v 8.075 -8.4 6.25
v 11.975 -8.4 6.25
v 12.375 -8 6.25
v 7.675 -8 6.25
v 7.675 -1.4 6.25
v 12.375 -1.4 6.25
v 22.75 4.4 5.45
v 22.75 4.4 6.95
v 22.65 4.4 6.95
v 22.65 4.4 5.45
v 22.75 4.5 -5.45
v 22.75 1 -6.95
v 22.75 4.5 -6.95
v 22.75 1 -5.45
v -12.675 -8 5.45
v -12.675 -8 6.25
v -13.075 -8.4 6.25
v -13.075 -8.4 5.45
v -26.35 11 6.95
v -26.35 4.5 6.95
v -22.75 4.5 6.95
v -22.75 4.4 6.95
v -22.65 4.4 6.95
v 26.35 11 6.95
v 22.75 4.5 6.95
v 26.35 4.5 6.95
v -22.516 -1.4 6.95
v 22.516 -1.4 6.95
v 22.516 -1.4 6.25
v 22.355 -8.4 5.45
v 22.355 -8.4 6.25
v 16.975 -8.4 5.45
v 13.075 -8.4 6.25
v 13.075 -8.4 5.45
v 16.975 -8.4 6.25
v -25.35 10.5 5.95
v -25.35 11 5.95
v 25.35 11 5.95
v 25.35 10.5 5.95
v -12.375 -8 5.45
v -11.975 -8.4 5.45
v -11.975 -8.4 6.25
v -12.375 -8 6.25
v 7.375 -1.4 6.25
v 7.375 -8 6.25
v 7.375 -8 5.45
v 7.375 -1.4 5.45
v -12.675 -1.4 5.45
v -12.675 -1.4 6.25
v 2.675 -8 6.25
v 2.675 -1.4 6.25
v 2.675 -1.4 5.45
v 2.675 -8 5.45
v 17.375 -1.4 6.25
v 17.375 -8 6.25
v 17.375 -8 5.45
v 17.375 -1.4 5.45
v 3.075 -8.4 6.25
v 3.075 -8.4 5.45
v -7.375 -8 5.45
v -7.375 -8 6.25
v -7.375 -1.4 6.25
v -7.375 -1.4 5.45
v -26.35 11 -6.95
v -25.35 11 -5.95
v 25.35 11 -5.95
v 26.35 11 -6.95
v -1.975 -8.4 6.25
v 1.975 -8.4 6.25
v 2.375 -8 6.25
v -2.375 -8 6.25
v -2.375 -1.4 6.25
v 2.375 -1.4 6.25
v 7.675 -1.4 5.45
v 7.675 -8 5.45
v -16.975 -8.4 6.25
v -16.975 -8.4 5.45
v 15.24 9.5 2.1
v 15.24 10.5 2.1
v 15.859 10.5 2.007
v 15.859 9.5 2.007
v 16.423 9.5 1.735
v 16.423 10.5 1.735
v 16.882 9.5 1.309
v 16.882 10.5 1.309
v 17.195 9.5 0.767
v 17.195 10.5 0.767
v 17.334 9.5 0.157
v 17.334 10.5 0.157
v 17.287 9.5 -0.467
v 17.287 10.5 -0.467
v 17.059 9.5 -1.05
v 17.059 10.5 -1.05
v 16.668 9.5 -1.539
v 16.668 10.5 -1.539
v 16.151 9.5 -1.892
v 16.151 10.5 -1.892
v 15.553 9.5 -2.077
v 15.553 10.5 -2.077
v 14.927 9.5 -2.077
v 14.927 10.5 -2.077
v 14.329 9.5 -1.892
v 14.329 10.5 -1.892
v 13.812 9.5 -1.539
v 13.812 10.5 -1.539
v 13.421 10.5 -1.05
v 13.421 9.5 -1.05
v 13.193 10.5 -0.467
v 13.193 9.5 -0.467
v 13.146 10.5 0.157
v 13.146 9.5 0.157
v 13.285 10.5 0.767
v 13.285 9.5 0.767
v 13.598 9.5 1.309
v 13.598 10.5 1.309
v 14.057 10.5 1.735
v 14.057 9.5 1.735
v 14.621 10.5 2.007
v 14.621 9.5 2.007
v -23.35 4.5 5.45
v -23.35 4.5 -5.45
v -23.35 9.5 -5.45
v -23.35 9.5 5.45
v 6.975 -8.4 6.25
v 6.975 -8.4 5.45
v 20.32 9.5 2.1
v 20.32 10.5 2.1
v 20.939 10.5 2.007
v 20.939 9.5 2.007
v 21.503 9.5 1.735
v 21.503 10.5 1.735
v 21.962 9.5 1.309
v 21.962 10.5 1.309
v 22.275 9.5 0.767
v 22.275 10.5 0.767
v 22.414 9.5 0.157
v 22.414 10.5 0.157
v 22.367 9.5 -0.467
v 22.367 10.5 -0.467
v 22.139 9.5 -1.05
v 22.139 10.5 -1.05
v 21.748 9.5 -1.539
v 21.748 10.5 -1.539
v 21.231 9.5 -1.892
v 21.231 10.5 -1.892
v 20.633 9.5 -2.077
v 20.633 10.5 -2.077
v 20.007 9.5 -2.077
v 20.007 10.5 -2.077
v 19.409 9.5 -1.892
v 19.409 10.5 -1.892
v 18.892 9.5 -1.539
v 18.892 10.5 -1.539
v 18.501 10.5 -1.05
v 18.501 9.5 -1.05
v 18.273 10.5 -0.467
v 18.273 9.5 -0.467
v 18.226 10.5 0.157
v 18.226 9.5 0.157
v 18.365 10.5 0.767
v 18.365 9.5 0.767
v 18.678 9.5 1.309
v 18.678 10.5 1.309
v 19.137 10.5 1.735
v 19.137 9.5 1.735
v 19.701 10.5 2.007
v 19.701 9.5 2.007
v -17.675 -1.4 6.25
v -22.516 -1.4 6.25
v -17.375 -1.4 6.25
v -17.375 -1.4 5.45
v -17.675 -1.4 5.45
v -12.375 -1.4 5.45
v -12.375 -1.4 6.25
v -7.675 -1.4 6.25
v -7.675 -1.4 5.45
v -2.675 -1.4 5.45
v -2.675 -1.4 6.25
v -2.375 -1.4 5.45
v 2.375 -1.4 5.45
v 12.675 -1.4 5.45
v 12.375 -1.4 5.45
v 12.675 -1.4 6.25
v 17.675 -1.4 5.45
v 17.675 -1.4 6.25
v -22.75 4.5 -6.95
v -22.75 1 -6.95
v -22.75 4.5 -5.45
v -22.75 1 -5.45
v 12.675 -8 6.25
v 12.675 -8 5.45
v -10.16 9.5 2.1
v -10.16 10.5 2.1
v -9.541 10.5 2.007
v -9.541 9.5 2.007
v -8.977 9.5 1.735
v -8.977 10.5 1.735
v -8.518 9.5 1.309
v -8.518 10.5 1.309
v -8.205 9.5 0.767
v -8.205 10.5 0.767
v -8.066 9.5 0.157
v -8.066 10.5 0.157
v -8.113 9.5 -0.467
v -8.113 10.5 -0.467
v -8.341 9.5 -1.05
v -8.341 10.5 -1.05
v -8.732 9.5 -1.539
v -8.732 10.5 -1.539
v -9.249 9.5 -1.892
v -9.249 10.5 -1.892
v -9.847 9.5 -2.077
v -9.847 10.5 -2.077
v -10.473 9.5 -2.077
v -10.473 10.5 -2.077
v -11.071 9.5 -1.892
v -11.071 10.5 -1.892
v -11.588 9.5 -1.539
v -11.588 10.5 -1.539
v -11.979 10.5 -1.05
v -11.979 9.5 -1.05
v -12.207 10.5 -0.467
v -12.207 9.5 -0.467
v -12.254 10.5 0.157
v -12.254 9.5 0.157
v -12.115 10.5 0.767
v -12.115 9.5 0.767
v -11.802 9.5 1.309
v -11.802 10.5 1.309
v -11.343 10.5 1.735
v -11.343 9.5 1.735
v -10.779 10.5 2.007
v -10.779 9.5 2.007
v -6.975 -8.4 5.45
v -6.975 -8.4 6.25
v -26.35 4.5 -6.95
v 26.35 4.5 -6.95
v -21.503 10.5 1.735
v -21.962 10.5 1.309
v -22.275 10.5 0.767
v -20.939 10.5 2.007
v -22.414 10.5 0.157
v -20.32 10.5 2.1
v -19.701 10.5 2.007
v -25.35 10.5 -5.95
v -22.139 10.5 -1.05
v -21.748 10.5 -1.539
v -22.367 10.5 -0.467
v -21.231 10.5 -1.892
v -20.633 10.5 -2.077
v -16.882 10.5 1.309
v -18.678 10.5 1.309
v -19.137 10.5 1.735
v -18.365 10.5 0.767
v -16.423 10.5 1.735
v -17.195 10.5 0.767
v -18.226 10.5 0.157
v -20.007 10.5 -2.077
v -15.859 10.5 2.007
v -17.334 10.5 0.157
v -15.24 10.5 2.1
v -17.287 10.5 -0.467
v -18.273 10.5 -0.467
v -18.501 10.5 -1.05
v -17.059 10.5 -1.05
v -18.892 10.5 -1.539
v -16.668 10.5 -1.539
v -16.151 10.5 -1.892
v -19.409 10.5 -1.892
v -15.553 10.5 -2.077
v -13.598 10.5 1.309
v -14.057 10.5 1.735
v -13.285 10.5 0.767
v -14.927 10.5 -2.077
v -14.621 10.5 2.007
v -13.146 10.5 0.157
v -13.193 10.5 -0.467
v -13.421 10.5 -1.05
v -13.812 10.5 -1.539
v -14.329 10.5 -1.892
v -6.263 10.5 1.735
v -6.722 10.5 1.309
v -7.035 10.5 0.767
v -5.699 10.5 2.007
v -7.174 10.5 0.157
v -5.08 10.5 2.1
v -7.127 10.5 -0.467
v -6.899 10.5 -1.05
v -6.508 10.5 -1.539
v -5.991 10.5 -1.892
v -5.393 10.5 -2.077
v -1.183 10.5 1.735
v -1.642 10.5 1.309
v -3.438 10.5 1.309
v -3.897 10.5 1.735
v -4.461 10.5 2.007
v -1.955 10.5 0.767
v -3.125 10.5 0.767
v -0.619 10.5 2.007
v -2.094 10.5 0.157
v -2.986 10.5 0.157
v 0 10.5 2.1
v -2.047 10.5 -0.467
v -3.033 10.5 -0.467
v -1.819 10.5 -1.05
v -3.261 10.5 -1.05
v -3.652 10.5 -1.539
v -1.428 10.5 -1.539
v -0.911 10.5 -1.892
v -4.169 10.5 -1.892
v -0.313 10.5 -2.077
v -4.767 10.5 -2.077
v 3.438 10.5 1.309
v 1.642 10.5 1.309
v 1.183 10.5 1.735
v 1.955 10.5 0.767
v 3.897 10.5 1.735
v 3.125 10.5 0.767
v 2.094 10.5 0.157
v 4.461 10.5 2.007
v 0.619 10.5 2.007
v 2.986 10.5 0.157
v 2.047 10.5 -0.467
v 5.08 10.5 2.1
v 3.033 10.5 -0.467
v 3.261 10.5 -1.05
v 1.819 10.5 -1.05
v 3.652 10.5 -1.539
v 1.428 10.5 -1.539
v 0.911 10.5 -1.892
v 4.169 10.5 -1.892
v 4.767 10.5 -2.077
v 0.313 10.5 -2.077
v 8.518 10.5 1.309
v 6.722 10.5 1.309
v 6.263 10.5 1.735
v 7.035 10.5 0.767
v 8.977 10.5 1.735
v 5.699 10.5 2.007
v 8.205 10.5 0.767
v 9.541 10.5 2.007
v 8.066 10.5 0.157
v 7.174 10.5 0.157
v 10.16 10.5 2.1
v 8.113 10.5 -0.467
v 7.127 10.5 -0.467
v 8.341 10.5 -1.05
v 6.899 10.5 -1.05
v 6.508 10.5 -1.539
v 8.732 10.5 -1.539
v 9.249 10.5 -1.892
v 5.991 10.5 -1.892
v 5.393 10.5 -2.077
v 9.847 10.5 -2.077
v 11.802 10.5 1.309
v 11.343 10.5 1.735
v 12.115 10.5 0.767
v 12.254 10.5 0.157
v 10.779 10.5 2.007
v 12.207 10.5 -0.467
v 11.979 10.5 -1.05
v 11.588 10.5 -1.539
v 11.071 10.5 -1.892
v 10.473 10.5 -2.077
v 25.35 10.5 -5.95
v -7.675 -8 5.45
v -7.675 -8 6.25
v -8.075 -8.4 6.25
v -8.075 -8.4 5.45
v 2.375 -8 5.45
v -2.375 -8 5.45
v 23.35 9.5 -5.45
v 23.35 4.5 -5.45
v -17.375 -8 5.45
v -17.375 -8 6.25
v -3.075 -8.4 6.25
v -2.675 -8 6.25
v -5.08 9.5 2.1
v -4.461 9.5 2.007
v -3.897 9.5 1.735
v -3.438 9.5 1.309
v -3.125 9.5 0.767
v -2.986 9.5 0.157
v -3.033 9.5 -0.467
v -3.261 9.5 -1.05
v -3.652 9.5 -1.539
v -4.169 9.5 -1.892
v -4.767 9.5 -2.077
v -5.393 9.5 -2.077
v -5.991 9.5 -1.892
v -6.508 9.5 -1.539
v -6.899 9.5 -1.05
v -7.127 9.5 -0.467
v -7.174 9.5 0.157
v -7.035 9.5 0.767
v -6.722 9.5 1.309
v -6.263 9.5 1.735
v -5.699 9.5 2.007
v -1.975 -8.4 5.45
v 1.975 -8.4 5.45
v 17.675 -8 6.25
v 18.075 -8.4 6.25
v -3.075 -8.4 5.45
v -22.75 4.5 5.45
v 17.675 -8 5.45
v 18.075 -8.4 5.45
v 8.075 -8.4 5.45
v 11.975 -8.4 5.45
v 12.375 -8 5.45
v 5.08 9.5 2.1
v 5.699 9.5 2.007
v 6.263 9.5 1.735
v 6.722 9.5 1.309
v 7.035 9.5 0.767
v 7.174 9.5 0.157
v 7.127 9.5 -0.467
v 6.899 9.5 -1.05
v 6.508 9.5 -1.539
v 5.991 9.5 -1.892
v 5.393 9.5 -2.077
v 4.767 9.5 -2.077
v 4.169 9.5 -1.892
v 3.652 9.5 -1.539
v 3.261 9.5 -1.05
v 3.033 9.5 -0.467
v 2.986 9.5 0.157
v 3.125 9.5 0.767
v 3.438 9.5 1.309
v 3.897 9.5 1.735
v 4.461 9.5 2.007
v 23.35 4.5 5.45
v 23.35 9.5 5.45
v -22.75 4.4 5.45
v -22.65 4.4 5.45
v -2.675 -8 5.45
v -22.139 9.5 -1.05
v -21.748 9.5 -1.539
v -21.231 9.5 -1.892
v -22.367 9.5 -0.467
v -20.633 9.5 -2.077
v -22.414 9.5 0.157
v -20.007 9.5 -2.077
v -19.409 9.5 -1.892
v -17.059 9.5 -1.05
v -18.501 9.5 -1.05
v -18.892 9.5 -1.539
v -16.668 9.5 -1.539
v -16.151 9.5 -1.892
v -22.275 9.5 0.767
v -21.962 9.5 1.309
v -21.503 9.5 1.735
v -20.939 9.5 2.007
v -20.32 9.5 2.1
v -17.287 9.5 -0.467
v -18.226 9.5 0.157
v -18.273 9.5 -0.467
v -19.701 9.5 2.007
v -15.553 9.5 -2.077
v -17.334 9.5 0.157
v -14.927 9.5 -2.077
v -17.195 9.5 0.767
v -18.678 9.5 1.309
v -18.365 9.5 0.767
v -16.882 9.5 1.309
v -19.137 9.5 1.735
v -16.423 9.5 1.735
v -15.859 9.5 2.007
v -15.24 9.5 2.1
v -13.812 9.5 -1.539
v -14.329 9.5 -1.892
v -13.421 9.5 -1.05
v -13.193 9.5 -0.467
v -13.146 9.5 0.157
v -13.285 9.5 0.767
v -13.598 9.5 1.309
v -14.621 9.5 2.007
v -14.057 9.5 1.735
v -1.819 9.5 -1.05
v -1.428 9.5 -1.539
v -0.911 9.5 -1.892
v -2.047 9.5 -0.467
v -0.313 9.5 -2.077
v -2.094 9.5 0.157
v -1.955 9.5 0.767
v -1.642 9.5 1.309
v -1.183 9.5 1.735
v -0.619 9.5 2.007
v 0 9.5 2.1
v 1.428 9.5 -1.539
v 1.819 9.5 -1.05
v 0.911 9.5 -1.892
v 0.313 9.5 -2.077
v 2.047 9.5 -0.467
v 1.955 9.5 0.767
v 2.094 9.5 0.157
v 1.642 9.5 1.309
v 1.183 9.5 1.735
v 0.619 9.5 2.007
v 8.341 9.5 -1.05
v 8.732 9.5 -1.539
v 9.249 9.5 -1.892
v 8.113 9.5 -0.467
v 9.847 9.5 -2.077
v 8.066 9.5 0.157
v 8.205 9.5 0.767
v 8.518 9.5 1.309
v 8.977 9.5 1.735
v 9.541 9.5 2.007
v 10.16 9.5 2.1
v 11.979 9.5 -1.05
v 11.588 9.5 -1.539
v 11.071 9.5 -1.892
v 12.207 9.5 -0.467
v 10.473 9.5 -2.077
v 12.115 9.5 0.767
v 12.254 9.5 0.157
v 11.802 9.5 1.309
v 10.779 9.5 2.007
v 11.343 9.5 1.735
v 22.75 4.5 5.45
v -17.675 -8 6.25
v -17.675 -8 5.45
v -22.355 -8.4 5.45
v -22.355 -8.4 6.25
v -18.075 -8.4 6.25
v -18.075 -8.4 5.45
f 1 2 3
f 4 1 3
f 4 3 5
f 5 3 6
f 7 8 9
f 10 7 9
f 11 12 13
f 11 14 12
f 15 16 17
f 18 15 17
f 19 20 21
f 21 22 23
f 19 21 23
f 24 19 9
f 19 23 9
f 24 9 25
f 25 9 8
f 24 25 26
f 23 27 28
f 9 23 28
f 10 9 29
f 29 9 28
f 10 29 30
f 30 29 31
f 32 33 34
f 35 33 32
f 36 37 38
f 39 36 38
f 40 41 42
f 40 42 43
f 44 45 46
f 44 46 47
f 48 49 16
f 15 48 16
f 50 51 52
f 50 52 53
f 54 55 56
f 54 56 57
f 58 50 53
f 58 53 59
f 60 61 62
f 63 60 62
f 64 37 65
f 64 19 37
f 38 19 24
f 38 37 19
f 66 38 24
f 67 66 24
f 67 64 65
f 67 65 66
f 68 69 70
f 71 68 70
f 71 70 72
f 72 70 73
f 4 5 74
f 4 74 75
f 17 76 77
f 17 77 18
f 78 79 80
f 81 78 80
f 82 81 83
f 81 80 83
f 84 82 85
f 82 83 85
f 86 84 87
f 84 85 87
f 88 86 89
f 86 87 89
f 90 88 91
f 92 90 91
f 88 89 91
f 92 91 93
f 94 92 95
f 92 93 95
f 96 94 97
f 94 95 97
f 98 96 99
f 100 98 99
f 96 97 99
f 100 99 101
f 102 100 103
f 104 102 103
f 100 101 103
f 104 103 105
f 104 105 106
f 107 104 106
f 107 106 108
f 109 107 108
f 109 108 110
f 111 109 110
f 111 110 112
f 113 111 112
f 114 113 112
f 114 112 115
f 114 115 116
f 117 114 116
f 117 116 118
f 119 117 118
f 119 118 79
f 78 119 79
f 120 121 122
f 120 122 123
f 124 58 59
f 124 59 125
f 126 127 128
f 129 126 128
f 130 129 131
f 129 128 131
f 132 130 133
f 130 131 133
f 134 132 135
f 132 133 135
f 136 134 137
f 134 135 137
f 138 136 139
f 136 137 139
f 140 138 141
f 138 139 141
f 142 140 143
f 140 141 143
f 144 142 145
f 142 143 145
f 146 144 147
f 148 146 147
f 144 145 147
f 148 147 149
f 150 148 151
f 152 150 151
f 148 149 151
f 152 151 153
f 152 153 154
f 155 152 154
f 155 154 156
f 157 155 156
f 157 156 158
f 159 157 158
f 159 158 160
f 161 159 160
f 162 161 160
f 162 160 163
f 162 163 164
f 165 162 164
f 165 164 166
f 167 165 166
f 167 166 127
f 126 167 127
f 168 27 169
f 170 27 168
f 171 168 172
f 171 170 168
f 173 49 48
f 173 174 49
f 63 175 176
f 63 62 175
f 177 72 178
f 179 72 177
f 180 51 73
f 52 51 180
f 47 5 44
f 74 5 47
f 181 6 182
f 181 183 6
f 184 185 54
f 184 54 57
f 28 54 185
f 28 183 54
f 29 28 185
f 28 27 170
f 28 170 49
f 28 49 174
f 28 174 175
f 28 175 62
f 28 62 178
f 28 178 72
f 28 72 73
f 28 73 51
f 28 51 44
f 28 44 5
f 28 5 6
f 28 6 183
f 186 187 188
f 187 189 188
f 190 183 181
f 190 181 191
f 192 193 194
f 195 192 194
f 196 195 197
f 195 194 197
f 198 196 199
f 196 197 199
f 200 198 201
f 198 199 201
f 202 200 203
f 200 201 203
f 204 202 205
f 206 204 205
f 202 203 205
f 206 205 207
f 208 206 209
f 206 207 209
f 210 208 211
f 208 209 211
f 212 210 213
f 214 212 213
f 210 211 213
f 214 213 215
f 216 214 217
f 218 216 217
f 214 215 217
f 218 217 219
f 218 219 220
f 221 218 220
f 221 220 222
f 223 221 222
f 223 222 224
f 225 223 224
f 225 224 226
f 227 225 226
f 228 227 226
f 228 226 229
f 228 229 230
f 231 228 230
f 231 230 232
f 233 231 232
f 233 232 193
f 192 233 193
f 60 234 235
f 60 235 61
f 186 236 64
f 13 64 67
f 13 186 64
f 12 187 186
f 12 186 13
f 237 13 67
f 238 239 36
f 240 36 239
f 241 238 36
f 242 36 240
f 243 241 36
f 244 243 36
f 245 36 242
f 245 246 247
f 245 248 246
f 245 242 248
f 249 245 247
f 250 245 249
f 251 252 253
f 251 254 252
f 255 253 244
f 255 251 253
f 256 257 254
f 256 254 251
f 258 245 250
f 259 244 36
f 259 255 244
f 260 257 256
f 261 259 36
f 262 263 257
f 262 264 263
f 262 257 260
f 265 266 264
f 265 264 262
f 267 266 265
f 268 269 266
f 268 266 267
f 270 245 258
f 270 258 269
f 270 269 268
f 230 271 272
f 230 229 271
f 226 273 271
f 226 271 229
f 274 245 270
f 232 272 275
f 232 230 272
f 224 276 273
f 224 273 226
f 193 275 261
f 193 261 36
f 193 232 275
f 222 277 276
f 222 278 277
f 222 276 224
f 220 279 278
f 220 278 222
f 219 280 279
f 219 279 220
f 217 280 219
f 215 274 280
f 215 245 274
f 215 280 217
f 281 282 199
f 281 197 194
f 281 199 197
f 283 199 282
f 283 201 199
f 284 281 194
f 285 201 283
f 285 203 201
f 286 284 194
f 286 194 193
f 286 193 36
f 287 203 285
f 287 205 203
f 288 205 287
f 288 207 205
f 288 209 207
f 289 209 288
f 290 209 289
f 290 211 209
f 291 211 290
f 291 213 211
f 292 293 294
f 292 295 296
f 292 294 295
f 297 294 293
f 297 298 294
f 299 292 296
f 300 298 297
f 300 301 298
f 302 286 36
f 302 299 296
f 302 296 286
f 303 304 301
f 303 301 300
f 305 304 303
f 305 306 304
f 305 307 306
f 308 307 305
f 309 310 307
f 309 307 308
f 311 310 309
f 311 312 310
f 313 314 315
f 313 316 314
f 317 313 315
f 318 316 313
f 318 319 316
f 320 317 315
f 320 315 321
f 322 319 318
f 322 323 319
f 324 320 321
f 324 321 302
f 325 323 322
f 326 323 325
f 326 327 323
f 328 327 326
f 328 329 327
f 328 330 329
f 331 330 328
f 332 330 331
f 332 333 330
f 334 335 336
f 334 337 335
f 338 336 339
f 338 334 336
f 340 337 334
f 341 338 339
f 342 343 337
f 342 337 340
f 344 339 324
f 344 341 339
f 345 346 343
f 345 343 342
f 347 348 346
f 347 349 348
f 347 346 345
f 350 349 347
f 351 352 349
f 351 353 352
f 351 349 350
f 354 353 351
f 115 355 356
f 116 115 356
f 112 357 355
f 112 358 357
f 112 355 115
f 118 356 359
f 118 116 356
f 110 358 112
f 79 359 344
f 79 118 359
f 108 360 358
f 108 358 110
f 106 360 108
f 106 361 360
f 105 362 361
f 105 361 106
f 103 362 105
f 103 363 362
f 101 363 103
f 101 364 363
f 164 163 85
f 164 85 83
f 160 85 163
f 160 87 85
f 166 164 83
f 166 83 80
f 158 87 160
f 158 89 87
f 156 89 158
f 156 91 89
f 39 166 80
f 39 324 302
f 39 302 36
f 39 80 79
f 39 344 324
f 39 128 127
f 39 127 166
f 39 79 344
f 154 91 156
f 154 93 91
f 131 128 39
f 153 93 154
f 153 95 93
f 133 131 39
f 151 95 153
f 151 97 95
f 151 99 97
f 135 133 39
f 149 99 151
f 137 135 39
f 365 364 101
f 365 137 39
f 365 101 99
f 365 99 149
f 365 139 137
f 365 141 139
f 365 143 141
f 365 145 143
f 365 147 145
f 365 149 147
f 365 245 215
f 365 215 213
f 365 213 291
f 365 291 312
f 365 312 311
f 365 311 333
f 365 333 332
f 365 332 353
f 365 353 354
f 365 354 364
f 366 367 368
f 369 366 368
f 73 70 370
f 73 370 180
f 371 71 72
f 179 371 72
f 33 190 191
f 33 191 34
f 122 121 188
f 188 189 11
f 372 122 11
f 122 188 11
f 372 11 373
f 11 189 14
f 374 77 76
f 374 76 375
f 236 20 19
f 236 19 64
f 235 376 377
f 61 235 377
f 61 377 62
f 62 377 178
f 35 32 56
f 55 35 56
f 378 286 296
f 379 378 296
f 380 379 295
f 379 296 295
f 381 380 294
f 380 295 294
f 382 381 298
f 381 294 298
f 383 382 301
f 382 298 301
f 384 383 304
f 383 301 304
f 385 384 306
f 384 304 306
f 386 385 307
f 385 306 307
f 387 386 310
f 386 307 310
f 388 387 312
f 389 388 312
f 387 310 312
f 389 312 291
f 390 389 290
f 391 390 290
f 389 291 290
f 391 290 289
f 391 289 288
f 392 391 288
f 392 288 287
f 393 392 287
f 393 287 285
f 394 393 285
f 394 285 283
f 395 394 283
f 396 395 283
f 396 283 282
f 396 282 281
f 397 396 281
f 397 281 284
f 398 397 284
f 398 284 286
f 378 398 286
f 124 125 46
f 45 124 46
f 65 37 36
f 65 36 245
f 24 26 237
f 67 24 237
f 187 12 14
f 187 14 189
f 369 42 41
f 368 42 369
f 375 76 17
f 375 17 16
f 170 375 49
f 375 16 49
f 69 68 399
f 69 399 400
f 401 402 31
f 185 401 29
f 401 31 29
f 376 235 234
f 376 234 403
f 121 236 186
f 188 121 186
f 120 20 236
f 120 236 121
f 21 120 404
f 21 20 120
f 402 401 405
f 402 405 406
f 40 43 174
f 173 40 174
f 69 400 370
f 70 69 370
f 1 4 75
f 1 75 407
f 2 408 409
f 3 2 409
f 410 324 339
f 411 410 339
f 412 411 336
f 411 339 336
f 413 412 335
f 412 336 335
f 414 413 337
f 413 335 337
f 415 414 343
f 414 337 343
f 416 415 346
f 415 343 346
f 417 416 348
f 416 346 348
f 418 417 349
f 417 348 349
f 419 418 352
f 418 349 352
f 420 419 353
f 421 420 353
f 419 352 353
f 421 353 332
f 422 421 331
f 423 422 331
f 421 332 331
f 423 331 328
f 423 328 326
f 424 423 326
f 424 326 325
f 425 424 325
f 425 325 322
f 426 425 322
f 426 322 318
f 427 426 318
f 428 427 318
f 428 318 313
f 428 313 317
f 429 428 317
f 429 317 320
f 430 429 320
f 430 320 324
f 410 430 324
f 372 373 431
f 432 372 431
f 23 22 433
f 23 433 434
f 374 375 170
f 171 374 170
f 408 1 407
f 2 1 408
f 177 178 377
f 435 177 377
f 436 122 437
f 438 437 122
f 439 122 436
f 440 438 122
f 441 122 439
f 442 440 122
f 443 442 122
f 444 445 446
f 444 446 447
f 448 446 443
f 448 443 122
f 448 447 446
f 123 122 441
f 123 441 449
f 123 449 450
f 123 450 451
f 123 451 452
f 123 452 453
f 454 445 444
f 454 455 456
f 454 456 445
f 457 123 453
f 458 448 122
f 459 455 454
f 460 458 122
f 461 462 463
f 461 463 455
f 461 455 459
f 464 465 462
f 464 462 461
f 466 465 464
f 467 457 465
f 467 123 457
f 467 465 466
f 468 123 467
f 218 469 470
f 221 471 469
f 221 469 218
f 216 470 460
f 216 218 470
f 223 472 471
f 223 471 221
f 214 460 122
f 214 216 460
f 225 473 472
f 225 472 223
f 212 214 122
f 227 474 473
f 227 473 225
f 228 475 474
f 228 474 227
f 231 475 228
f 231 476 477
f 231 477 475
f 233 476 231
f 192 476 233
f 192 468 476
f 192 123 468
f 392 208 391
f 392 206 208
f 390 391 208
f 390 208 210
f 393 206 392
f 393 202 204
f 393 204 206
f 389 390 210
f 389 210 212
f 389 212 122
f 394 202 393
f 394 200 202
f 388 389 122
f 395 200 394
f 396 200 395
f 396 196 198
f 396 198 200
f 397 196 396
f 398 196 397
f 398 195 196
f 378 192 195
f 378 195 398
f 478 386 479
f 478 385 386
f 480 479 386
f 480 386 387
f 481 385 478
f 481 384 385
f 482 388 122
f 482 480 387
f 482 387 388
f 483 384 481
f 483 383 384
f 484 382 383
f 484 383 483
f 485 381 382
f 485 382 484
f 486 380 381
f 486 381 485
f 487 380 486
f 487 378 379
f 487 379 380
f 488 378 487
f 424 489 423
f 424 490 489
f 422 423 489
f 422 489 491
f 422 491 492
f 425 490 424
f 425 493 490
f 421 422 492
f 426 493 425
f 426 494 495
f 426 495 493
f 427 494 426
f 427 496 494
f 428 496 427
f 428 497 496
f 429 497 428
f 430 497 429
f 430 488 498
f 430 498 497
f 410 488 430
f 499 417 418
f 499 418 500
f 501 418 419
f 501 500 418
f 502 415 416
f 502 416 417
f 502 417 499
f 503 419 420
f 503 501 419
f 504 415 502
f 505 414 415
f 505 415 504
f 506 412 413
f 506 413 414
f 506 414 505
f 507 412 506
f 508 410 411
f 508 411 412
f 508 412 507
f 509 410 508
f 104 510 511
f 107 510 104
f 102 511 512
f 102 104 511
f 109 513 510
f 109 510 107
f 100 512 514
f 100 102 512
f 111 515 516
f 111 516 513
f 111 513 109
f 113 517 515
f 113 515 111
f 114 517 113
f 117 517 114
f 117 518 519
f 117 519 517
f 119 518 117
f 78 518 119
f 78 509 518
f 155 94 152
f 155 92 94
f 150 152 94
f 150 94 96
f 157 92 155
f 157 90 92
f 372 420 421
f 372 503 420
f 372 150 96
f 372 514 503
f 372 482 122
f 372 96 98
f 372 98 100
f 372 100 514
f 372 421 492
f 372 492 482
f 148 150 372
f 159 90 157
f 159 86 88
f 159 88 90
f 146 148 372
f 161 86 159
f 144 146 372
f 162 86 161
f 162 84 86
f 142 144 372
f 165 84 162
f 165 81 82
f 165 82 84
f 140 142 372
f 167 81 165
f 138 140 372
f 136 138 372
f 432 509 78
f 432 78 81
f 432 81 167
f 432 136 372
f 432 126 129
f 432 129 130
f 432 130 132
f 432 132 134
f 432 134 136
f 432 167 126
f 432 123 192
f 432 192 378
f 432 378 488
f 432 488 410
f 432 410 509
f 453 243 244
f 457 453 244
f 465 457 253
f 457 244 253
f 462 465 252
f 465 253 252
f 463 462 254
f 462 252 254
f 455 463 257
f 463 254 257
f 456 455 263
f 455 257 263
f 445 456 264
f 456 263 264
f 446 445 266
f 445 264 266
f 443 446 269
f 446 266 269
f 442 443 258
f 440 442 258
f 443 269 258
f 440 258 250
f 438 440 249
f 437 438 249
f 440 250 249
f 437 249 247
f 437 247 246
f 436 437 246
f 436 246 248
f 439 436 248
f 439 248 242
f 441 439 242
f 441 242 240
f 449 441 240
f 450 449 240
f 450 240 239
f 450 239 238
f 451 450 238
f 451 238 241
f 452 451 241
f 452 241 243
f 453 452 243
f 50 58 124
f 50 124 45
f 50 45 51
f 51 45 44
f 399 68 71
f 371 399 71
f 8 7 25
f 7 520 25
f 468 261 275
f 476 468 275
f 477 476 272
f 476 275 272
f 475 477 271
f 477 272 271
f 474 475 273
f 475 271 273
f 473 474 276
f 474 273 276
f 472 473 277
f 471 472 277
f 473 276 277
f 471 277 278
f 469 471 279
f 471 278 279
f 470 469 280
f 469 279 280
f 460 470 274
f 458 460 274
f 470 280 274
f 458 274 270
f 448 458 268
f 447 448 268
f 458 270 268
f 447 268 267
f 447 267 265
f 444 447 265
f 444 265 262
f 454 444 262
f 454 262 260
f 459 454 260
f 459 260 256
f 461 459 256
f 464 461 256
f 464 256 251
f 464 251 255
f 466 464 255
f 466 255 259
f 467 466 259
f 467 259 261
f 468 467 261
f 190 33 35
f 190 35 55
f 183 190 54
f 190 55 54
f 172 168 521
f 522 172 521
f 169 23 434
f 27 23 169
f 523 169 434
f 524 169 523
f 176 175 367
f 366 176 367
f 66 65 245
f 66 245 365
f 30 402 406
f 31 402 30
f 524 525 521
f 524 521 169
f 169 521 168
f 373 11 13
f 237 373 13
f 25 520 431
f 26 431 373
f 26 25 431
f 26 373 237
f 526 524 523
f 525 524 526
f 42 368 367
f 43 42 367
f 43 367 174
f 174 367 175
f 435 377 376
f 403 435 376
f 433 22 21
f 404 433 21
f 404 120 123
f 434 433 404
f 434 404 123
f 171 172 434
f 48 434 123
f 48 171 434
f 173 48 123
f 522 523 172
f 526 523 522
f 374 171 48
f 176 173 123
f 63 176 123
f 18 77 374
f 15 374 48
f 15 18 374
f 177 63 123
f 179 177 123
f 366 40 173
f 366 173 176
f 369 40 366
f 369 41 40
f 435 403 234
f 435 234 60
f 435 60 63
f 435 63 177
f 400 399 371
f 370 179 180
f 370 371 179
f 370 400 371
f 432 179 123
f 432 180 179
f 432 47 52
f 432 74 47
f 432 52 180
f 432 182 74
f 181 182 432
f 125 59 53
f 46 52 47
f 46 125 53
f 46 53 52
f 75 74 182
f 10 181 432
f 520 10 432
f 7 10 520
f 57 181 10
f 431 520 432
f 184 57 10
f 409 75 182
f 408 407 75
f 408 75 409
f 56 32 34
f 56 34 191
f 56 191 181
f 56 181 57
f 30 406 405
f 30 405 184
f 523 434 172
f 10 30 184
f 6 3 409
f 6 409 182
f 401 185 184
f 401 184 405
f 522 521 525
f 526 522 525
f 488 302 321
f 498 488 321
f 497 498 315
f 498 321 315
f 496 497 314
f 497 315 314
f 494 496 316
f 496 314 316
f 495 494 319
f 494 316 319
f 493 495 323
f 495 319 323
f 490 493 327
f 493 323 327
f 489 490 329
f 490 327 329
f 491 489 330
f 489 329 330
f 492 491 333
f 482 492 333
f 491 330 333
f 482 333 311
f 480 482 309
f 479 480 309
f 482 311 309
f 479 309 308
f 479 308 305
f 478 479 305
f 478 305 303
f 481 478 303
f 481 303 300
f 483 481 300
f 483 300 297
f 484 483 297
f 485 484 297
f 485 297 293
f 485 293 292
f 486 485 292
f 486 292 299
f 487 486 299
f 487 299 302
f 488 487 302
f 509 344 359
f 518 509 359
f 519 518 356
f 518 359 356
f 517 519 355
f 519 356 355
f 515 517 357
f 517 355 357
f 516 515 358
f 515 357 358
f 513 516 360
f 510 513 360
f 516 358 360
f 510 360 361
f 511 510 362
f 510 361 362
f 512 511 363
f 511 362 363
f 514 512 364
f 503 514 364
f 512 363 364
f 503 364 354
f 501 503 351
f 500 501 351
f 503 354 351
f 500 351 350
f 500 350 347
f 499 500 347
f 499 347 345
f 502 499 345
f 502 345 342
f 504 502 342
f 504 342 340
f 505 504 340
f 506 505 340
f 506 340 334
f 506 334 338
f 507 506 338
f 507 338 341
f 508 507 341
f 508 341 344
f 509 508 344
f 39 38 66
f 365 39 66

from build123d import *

# Parameters (mm, degrees)
SKETCH_1_W                 = 52.7
SKETCH_1_H                 = 13.9
EXTRUDE_1_DEPTH            = 11
SKETCH_2_W                 = 46.7
SKETCH_2_H                 = 10.9
CUT_EXTRUDE_1_DEPTH        = 9.5
SKETCH_3_W                 = 45.5
SKETCH_3_H                 = 1.5
EXTRUDE_2_DEPTH            = 8.4
SKETCH_4_W                 = 1
SKETCH_4_H                 = 7.5
CUT_EXTRUDE_2_DEPTH        = 51.794807806
CUT_EXTRUDE_3_DEPTH        = 3
PATTERN_LINEAR_1_COUNT     = 4
PATTERN_LINEAR_1_PITCH     = 5
CUT_EXTRUDE_4_DEPTH        = 3
PATTERN_LINEAR_2_COUNT     = 4
PATTERN_LINEAR_2_PITCH     = 5
SKETCH_7_W                 = 3.6
SKETCH_7_H                 = 5.5
CUT_EXTRUDE_5_DEPTH        = 32.757400712
SKETCH_8_W                 = 50.7
SKETCH_8_H                 = 11.9
CUT_EXTRUDE_6_DEPTH        = 0.5
SKETCH_9_R                 = 2.1
CUT_EXTRUDE_7_DEPTH        = 5
PATTERN_LINEAR_3_COUNT     = 5
PATTERN_LINEAR_3_PITCH     = 5.08
PATTERN_LINEAR_3_COL_COUNT = 5
PATTERN_LINEAR_3_COL_PITCH = 5.08
SKETCH_10_W                = 47.5
SKETCH_10_H                = 2
CUT_EXTRUDE_8_DEPTH        = 3
CUT_EXTRUDE_9_DEPTH        = 3


with BuildPart() as part:
    # Эскиз1 → Бобышка-Вытянуть1 (new body)
    with BuildSketch(Plane(origin=(0, 0, 0), x_dir=(1, 0, 0), z_dir=(0, 1, 0))):
        Rectangle(SKETCH_1_W, SKETCH_1_H)
    extrude(amount=EXTRUDE_1_DEPTH)

    # Эскиз2 → Вырез-Вытянуть1 (cut)
    with BuildSketch(Plane.XZ):
        Rectangle(SKETCH_2_W, SKETCH_2_H)
    extrude(amount=-CUT_EXTRUDE_1_DEPTH, mode=Mode.SUBTRACT)

    # Эскиз3 → Бобышка-Вытянуть2 (add)
    with BuildSketch(Plane.XZ):
        with Locations((0, 6.2)):
            Rectangle(SKETCH_3_W, SKETCH_3_H)
    extrude(amount=EXTRUDE_2_DEPTH)

    # Эскиз4 → Вырез-Вытянуть2 (cut, through all)
    with BuildSketch(Plane(origin=(22.75, 0, 0), x_dir=(0, 0, -1), z_dir=(1, 0, 0))):
        with Locations((-6.75, -5.15)):
            Rectangle(SKETCH_4_W, SKETCH_4_H)
    extrude(amount=-CUT_EXTRUDE_2_DEPTH, mode=Mode.SUBTRACT)

    # Эскиз5 → Вырез-Вытянуть3 (cut)
    with BuildSketch(Plane.XY.offset(6.25)):
        Polygon((-2.675, -1.4), (-2.675, -8), (-3.175, -8.5), (-3.675, -8.5), (-3.675, -9.5), (-1.375, -9.5), (-1.375, -8.5), (-1.875, -8.5), (-2.375, -8), (-2.375, -1.4), align=None)
    cut_extrude_3 = extrude(amount=-CUT_EXTRUDE_3_DEPTH, mode=Mode.SUBTRACT)

    # Линейный массив1: Вырез-Вытянуть3 ×4
    with Locations(*[(-i * PATTERN_LINEAR_1_PITCH, 0, 0) for i in range(1, PATTERN_LINEAR_1_COUNT)]):
        add(cut_extrude_3, mode=Mode.SUBTRACT)

    # Эскиз6 → Вырез-Вытянуть4 (cut)
    with BuildSketch(Plane.XY.offset(6.25)):
        Polygon((2.375, -1.4), (2.675, -1.4), (2.675, -8), (3.175, -8.5), (3.675, -8.5), (3.675, -9), (1.375, -9), (1.375, -8.5), (1.875, -8.5), (2.375, -8), align=None)
    cut_extrude_4 = extrude(amount=-CUT_EXTRUDE_4_DEPTH, mode=Mode.SUBTRACT)

    # Линейный массив2: Вырез-Вытянуть4 ×4
    with Locations(*[(i * PATTERN_LINEAR_2_PITCH, 0, 0) for i in range(1, PATTERN_LINEAR_2_COUNT)]):
        add(cut_extrude_4, mode=Mode.SUBTRACT)

    # Эскиз7 → Вырез-Вытянуть5 (cut, through all)
    with BuildSketch(Plane.XY.offset(6.95)):
        with Locations((-24.55, 1.75)):
            Rectangle(SKETCH_7_W, SKETCH_7_H)
        with Locations((24.55, 1.75)):
            Rectangle(SKETCH_7_W, SKETCH_7_H)
    extrude(amount=-CUT_EXTRUDE_5_DEPTH, mode=Mode.SUBTRACT)

    # Эскиз8 → Вырез-Вытянуть6 (cut)
    with BuildSketch(Plane(origin=(0, 11, 0), x_dir=(1, 0, 0), z_dir=(0, 1, 0))):
        Rectangle(SKETCH_8_W, SKETCH_8_H)
    extrude(amount=-CUT_EXTRUDE_6_DEPTH, mode=Mode.SUBTRACT)

    # Эскиз9 → Вырез-Вытянуть7 (cut)
    with BuildSketch(Plane(origin=(0, 10.5, 0), x_dir=(1, 0, 0), z_dir=(0, 1, 0))):
        with Locations(Location((0, 0, 0), (0, 0, 270))):
            Circle(SKETCH_9_R)
    cut_extrude_7 = extrude(amount=-CUT_EXTRUDE_7_DEPTH, mode=Mode.SUBTRACT)

    # Линейный массив3: Вырез-Вытянуть7 ×5
    with Locations(*[(-i * PATTERN_LINEAR_3_PITCH, 0, 0) for i in range(1, PATTERN_LINEAR_3_COUNT)]):
        add(cut_extrude_7, mode=Mode.SUBTRACT)

    # Линейный массив3 col: Вырез-Вытянуть7 ×5
    with Locations(*[(i * PATTERN_LINEAR_3_COL_PITCH, 0, 0) for i in range(1, PATTERN_LINEAR_3_COL_COUNT)]):
        add(cut_extrude_7, mode=Mode.SUBTRACT)

    # Эскиз10 → Вырез-Вытянуть8 (cut)
    with BuildSketch(Plane(origin=(0, 0, -6.95), x_dir=(-1, 0, 0), z_dir=(0, 0, -1))):
        Rectangle(SKETCH_10_W, SKETCH_10_H)
    extrude(amount=-CUT_EXTRUDE_8_DEPTH, mode=Mode.SUBTRACT)

    # Эскиз13 → Вырез-Вытянуть9 (cut)
    with BuildSketch(Plane.XY.offset(6.95)):
        Polygon((-26.35, 4.4), (-22.65, 4.4), (-22.35, -8.6), (-26.35, -8.6), align=None)
    cut_extrude_9 = extrude(amount=-CUT_EXTRUDE_9_DEPTH, mode=Mode.SUBTRACT)

    # Зеркальное отражение1: Вырез-Вытянуть9 across plane
    add(cut_extrude_9.mirror(Plane(origin=(0, 0, 0), x_dir=(0, 0, 1), z_dir=(1, 0, 0))), mode=Mode.SUBTRACT)


solid = part.part
